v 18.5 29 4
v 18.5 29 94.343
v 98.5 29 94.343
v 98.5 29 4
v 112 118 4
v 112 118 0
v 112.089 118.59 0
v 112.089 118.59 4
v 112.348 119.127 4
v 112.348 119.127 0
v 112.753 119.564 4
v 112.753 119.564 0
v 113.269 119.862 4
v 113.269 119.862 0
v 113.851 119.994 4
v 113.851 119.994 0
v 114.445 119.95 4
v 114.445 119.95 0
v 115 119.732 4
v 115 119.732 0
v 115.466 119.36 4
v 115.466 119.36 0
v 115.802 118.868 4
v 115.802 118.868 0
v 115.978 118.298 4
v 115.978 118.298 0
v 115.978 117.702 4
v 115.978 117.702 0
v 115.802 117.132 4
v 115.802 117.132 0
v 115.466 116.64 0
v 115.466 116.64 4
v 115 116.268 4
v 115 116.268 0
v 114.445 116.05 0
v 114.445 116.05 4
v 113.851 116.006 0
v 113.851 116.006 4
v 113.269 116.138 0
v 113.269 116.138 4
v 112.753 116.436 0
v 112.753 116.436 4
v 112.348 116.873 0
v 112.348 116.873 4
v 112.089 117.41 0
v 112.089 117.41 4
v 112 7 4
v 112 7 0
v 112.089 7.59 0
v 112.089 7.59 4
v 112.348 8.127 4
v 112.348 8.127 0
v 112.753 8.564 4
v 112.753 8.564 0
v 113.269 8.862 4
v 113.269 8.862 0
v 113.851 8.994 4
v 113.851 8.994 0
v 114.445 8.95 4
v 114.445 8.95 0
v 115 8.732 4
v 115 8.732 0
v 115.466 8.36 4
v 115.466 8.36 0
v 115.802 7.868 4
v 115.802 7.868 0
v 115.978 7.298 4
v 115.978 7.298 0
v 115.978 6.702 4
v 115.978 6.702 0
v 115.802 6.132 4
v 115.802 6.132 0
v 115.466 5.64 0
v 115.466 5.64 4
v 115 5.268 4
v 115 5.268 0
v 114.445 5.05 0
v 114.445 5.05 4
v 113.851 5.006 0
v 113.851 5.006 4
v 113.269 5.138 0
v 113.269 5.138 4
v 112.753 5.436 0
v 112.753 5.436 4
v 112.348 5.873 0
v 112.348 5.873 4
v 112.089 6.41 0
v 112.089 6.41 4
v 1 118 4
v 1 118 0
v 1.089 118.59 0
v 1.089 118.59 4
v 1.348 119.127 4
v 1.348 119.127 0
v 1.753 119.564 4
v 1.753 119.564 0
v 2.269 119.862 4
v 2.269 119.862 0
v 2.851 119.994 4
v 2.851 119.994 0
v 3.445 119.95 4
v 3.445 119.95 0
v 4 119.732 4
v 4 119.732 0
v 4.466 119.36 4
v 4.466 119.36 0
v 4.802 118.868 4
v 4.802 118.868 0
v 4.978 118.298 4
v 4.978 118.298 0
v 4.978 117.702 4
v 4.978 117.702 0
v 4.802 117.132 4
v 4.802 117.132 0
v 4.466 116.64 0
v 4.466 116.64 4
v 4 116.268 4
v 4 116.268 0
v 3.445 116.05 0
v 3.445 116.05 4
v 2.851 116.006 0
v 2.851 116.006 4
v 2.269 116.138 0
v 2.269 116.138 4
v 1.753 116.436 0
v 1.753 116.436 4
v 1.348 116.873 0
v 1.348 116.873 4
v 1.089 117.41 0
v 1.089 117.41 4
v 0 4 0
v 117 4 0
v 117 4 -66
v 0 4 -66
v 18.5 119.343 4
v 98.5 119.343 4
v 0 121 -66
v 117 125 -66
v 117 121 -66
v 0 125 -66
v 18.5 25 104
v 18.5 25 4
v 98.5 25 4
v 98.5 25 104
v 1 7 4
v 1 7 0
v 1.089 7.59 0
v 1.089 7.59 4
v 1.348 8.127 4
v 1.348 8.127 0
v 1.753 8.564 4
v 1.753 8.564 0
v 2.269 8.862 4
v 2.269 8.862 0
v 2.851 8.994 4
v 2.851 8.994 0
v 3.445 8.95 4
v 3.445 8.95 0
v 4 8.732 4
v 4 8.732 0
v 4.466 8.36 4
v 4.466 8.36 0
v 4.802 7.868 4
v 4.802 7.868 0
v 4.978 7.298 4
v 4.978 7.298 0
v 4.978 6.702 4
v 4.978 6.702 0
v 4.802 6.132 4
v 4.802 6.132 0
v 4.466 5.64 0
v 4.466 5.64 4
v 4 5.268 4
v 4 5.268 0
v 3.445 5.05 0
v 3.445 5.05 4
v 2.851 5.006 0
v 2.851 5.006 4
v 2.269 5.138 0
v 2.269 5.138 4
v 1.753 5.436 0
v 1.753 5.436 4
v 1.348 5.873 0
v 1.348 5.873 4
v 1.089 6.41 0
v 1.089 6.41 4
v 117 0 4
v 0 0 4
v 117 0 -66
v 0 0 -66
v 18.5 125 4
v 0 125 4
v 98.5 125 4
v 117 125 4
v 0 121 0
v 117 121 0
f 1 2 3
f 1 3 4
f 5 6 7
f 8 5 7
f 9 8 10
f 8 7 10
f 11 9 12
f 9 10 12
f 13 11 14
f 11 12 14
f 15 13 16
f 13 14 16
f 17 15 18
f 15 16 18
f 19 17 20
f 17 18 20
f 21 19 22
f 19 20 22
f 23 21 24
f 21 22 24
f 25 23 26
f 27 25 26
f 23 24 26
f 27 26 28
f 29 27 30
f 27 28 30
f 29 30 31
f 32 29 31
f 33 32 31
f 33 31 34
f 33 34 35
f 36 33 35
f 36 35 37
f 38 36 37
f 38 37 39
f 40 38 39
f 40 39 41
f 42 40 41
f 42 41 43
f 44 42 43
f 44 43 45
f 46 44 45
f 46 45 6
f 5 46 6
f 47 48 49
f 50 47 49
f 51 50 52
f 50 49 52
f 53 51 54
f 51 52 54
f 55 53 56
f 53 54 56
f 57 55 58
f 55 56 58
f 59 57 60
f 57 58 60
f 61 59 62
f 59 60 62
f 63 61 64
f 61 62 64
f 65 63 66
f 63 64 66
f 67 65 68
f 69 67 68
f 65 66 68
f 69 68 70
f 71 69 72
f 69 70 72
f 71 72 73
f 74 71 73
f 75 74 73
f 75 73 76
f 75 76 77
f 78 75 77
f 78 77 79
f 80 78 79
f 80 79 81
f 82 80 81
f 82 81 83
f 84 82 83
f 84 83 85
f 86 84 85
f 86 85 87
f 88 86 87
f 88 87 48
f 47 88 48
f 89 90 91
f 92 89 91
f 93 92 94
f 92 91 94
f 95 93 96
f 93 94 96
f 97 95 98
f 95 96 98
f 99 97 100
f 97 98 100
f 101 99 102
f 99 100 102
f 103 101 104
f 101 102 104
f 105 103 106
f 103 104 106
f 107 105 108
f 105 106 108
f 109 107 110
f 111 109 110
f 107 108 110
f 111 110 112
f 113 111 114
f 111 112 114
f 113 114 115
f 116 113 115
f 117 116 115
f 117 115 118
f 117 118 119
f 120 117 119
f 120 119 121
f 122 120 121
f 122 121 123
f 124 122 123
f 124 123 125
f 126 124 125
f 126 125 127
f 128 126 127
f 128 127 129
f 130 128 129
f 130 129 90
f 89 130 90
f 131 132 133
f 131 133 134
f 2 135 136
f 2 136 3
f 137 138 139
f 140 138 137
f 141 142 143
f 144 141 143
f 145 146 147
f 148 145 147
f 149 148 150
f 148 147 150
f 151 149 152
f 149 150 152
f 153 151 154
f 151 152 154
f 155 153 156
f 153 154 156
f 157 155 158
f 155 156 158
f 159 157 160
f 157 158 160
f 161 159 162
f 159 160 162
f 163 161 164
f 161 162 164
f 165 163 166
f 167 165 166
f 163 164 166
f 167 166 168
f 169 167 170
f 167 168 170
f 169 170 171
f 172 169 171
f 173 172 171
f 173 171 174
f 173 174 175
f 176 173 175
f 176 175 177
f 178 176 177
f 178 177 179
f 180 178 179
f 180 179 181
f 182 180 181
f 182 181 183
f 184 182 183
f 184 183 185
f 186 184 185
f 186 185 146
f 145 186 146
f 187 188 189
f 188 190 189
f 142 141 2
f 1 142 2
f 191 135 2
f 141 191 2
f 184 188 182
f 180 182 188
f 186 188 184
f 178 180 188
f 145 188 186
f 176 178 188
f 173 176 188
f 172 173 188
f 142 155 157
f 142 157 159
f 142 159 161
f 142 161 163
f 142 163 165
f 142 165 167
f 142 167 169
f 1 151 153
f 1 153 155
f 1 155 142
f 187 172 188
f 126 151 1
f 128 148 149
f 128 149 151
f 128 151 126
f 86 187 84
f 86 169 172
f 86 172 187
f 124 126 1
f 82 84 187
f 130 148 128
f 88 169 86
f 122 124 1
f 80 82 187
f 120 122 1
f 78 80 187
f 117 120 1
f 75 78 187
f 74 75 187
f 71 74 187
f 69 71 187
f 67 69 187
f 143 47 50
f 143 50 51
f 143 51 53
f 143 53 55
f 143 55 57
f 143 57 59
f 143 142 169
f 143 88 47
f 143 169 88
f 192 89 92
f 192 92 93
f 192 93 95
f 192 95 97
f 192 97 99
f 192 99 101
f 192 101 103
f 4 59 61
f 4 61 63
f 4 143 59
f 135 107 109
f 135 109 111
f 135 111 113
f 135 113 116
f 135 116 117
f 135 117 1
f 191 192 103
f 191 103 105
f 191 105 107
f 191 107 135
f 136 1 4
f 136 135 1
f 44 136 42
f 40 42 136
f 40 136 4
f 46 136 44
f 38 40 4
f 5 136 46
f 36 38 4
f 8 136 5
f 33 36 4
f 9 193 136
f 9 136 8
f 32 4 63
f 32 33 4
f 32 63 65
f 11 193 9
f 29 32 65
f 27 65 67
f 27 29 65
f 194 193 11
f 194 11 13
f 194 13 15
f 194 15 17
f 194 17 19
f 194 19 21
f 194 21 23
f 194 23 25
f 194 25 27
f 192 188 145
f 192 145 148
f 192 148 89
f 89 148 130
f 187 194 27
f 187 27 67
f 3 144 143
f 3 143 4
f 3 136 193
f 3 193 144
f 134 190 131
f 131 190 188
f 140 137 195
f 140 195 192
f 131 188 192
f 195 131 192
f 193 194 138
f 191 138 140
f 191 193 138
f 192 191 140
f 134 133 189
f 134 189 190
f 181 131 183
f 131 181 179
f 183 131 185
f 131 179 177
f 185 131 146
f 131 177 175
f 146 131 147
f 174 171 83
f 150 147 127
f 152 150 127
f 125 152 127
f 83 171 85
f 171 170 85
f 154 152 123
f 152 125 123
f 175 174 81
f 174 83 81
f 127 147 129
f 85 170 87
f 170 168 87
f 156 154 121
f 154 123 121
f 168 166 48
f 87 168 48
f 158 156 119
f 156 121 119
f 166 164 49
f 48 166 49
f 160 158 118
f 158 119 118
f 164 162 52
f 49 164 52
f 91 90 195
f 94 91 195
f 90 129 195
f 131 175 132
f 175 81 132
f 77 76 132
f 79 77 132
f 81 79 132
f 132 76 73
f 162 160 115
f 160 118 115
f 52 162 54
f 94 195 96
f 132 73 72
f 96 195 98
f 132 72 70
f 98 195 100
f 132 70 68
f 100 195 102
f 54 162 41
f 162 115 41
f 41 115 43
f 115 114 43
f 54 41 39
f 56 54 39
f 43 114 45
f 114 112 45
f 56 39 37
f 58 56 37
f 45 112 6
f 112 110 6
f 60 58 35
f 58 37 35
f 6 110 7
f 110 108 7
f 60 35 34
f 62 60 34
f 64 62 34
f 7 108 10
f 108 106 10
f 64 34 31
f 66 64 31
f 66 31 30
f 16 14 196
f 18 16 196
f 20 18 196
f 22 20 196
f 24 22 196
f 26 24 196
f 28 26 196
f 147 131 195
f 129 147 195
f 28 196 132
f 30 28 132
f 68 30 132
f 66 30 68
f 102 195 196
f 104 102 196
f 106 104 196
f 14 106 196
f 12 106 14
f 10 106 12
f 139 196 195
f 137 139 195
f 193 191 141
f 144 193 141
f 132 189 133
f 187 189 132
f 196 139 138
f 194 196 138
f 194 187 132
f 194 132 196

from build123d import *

# Parameters (mm, degrees)
SKIZZE1_W                       = 117
SKIZZE1_H                       = 125
AUFSATZ_LINEAR_AUSTRAGEN1_DEPTH = 4
SKIZZE2_W                       = 80
SKIZZE2_H                       = 100
AUFSATZ_LINEAR_AUSTRAGEN2_DEPTH = 100
SCHNITT_LINEAR_AUSTRAGEN1_DEPTH = 100
SCHNITT_LINEAR_AUSTRAGEN2_DEPTH = 100
SKIZZE5_W                       = 117
SKIZZE5_H                       = 4
AUFSATZ_LINEAR_AUSTRAGEN3_DEPTH = 66
SKIZZE6_R                       = 2
SCHNITT_LINEAR_AUSTRAGEN3_DEPTH = 70


with BuildPart() as part:
    # Skizze1 → Aufsatz-Linear austragen1 (new body)
    with BuildSketch(Plane.XY):
        with Locations((58.5, 62.5)):
            Rectangle(SKIZZE1_W, SKIZZE1_H)
    extrude(amount=AUFSATZ_LINEAR_AUSTRAGEN1_DEPTH)

    # Skizze2 → Aufsatz-Linear austragen2 (add)
    with BuildSketch(Plane.XY.offset(4)):
        with Locations((58.5, 75)):
            Rectangle(SKIZZE2_W, SKIZZE2_H)
    extrude(amount=AUFSATZ_LINEAR_AUSTRAGEN2_DEPTH)

    # Skizze3 → Schnitt-Linear austragen1 (cut)
    with BuildSketch(Plane.ZY.offset(-18.5)):
        Polygon((104, 25), (104, 125), (4, 125), align=None)
    extrude(amount=-SCHNITT_LINEAR_AUSTRAGEN1_DEPTH, mode=Mode.SUBTRACT)

    # Skizze4 → Schnitt-Linear austragen2 (cut)
    with BuildSketch(Plane.ZY.offset(-18.5)):
        Polygon((4, 119.343145751), (94.343145751, 29), (4, 29), align=None)
    extrude(amount=-SCHNITT_LINEAR_AUSTRAGEN2_DEPTH, mode=Mode.SUBTRACT)

    # Skizze5 → Aufsatz-Linear austragen3 (add)
    with BuildSketch(Plane(origin=(0, 0, 0), x_dir=(-1, 0, 0), z_dir=(0, 0, -1))):
        with Locations((-58.5, 123)):
            Rectangle(SKIZZE5_W, SKIZZE5_H)
        with Locations((-58.5, 2)):
            Rectangle(SKIZZE5_W, SKIZZE5_H)
    extrude(amount=AUFSATZ_LINEAR_AUSTRAGEN3_DEPTH)

    # Skizze6 → Schnitt-Linear austragen3 (cut)
    with BuildSketch(Plane(origin=(0, 0, 0), x_dir=(-1, 0, 0), z_dir=(0, 0, -1))):
        with Locations((-114, 118)):
            Circle(SKIZZE6_R)
        with Locations((-3, 118)):
            Circle(SKIZZE6_R)
        with Locations((-3, 7)):
            Circle(SKIZZE6_R)
        with Locations((-114, 7)):
            Circle(SKIZZE6_R)
    extrude(amount=-SCHNITT_LINEAR_AUSTRAGEN3_DEPTH, mode=Mode.SUBTRACT)


solid = part.part
